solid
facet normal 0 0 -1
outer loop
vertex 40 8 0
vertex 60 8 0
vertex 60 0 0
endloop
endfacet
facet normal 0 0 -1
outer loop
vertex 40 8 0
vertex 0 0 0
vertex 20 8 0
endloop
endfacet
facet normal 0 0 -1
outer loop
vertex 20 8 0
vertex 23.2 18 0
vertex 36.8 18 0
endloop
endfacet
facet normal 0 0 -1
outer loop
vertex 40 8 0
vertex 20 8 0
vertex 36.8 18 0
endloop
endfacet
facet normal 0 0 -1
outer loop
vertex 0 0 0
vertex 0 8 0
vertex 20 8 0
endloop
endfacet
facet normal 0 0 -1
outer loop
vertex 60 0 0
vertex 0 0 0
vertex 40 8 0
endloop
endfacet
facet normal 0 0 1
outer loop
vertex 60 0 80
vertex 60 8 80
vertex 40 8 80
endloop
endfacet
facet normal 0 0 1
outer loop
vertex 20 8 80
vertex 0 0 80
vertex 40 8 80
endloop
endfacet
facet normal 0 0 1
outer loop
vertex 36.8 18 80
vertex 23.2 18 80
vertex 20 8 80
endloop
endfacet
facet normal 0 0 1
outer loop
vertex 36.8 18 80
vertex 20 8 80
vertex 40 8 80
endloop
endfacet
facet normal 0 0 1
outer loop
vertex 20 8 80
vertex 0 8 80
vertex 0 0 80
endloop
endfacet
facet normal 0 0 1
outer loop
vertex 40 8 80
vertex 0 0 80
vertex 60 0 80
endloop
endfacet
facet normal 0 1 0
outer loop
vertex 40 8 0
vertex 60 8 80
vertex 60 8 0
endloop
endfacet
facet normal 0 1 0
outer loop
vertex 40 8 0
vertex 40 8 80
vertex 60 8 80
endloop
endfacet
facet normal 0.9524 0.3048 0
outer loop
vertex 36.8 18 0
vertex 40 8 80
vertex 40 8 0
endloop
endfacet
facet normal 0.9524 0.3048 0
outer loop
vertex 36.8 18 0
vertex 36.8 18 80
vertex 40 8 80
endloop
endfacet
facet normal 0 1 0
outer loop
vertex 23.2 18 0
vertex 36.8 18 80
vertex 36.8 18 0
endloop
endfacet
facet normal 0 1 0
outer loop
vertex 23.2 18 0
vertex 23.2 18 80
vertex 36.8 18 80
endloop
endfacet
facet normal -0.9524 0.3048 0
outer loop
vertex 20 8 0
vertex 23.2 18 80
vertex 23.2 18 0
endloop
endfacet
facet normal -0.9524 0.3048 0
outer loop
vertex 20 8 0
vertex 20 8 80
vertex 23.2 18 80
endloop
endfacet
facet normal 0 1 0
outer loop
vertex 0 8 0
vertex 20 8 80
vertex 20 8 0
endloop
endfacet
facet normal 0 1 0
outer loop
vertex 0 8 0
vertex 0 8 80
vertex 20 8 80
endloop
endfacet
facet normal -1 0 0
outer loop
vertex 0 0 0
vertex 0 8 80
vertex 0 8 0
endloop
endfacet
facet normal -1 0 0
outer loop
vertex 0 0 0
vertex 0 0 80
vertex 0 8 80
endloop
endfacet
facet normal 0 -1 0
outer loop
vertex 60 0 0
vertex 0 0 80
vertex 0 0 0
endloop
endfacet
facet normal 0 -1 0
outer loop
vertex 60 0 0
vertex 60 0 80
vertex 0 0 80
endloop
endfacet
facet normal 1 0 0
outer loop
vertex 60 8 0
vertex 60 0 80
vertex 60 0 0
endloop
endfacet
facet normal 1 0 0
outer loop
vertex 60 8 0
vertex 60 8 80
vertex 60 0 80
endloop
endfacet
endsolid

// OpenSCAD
$fn = 32;

// ----------------------------------------------------------------------
// V guide rail: dovetail, 60 mm wide
// ----------------------------------------------------------------------

// --- parameters (mm) ---
rail_w = 60;              // rail width, X
base_t = 8;               // base plate thickness
v_depth = 10;             // V feature depth / height
v_half_w = 10;            // half width of the V at the base face
plate_t = 80;             // rail length, Z (the extrusion height)
top_half_w = 6.8;         // half width at the dovetail top

dovetail_base = 2 * v_half_w;  // dovetail width at the base
dovetail_top = 2 * top_half_w;  // dovetail width at the top

profile = [[0, 0], [60, 0], [60, 8], [40, 8], [36.8, 18], [23.2, 18], [20, 8], [0, 8]];  // primary outline, 8 points, counter clockwise

// --- the one profile operation ---
linear_extrude(height = plate_t) polygon(points = profile);
